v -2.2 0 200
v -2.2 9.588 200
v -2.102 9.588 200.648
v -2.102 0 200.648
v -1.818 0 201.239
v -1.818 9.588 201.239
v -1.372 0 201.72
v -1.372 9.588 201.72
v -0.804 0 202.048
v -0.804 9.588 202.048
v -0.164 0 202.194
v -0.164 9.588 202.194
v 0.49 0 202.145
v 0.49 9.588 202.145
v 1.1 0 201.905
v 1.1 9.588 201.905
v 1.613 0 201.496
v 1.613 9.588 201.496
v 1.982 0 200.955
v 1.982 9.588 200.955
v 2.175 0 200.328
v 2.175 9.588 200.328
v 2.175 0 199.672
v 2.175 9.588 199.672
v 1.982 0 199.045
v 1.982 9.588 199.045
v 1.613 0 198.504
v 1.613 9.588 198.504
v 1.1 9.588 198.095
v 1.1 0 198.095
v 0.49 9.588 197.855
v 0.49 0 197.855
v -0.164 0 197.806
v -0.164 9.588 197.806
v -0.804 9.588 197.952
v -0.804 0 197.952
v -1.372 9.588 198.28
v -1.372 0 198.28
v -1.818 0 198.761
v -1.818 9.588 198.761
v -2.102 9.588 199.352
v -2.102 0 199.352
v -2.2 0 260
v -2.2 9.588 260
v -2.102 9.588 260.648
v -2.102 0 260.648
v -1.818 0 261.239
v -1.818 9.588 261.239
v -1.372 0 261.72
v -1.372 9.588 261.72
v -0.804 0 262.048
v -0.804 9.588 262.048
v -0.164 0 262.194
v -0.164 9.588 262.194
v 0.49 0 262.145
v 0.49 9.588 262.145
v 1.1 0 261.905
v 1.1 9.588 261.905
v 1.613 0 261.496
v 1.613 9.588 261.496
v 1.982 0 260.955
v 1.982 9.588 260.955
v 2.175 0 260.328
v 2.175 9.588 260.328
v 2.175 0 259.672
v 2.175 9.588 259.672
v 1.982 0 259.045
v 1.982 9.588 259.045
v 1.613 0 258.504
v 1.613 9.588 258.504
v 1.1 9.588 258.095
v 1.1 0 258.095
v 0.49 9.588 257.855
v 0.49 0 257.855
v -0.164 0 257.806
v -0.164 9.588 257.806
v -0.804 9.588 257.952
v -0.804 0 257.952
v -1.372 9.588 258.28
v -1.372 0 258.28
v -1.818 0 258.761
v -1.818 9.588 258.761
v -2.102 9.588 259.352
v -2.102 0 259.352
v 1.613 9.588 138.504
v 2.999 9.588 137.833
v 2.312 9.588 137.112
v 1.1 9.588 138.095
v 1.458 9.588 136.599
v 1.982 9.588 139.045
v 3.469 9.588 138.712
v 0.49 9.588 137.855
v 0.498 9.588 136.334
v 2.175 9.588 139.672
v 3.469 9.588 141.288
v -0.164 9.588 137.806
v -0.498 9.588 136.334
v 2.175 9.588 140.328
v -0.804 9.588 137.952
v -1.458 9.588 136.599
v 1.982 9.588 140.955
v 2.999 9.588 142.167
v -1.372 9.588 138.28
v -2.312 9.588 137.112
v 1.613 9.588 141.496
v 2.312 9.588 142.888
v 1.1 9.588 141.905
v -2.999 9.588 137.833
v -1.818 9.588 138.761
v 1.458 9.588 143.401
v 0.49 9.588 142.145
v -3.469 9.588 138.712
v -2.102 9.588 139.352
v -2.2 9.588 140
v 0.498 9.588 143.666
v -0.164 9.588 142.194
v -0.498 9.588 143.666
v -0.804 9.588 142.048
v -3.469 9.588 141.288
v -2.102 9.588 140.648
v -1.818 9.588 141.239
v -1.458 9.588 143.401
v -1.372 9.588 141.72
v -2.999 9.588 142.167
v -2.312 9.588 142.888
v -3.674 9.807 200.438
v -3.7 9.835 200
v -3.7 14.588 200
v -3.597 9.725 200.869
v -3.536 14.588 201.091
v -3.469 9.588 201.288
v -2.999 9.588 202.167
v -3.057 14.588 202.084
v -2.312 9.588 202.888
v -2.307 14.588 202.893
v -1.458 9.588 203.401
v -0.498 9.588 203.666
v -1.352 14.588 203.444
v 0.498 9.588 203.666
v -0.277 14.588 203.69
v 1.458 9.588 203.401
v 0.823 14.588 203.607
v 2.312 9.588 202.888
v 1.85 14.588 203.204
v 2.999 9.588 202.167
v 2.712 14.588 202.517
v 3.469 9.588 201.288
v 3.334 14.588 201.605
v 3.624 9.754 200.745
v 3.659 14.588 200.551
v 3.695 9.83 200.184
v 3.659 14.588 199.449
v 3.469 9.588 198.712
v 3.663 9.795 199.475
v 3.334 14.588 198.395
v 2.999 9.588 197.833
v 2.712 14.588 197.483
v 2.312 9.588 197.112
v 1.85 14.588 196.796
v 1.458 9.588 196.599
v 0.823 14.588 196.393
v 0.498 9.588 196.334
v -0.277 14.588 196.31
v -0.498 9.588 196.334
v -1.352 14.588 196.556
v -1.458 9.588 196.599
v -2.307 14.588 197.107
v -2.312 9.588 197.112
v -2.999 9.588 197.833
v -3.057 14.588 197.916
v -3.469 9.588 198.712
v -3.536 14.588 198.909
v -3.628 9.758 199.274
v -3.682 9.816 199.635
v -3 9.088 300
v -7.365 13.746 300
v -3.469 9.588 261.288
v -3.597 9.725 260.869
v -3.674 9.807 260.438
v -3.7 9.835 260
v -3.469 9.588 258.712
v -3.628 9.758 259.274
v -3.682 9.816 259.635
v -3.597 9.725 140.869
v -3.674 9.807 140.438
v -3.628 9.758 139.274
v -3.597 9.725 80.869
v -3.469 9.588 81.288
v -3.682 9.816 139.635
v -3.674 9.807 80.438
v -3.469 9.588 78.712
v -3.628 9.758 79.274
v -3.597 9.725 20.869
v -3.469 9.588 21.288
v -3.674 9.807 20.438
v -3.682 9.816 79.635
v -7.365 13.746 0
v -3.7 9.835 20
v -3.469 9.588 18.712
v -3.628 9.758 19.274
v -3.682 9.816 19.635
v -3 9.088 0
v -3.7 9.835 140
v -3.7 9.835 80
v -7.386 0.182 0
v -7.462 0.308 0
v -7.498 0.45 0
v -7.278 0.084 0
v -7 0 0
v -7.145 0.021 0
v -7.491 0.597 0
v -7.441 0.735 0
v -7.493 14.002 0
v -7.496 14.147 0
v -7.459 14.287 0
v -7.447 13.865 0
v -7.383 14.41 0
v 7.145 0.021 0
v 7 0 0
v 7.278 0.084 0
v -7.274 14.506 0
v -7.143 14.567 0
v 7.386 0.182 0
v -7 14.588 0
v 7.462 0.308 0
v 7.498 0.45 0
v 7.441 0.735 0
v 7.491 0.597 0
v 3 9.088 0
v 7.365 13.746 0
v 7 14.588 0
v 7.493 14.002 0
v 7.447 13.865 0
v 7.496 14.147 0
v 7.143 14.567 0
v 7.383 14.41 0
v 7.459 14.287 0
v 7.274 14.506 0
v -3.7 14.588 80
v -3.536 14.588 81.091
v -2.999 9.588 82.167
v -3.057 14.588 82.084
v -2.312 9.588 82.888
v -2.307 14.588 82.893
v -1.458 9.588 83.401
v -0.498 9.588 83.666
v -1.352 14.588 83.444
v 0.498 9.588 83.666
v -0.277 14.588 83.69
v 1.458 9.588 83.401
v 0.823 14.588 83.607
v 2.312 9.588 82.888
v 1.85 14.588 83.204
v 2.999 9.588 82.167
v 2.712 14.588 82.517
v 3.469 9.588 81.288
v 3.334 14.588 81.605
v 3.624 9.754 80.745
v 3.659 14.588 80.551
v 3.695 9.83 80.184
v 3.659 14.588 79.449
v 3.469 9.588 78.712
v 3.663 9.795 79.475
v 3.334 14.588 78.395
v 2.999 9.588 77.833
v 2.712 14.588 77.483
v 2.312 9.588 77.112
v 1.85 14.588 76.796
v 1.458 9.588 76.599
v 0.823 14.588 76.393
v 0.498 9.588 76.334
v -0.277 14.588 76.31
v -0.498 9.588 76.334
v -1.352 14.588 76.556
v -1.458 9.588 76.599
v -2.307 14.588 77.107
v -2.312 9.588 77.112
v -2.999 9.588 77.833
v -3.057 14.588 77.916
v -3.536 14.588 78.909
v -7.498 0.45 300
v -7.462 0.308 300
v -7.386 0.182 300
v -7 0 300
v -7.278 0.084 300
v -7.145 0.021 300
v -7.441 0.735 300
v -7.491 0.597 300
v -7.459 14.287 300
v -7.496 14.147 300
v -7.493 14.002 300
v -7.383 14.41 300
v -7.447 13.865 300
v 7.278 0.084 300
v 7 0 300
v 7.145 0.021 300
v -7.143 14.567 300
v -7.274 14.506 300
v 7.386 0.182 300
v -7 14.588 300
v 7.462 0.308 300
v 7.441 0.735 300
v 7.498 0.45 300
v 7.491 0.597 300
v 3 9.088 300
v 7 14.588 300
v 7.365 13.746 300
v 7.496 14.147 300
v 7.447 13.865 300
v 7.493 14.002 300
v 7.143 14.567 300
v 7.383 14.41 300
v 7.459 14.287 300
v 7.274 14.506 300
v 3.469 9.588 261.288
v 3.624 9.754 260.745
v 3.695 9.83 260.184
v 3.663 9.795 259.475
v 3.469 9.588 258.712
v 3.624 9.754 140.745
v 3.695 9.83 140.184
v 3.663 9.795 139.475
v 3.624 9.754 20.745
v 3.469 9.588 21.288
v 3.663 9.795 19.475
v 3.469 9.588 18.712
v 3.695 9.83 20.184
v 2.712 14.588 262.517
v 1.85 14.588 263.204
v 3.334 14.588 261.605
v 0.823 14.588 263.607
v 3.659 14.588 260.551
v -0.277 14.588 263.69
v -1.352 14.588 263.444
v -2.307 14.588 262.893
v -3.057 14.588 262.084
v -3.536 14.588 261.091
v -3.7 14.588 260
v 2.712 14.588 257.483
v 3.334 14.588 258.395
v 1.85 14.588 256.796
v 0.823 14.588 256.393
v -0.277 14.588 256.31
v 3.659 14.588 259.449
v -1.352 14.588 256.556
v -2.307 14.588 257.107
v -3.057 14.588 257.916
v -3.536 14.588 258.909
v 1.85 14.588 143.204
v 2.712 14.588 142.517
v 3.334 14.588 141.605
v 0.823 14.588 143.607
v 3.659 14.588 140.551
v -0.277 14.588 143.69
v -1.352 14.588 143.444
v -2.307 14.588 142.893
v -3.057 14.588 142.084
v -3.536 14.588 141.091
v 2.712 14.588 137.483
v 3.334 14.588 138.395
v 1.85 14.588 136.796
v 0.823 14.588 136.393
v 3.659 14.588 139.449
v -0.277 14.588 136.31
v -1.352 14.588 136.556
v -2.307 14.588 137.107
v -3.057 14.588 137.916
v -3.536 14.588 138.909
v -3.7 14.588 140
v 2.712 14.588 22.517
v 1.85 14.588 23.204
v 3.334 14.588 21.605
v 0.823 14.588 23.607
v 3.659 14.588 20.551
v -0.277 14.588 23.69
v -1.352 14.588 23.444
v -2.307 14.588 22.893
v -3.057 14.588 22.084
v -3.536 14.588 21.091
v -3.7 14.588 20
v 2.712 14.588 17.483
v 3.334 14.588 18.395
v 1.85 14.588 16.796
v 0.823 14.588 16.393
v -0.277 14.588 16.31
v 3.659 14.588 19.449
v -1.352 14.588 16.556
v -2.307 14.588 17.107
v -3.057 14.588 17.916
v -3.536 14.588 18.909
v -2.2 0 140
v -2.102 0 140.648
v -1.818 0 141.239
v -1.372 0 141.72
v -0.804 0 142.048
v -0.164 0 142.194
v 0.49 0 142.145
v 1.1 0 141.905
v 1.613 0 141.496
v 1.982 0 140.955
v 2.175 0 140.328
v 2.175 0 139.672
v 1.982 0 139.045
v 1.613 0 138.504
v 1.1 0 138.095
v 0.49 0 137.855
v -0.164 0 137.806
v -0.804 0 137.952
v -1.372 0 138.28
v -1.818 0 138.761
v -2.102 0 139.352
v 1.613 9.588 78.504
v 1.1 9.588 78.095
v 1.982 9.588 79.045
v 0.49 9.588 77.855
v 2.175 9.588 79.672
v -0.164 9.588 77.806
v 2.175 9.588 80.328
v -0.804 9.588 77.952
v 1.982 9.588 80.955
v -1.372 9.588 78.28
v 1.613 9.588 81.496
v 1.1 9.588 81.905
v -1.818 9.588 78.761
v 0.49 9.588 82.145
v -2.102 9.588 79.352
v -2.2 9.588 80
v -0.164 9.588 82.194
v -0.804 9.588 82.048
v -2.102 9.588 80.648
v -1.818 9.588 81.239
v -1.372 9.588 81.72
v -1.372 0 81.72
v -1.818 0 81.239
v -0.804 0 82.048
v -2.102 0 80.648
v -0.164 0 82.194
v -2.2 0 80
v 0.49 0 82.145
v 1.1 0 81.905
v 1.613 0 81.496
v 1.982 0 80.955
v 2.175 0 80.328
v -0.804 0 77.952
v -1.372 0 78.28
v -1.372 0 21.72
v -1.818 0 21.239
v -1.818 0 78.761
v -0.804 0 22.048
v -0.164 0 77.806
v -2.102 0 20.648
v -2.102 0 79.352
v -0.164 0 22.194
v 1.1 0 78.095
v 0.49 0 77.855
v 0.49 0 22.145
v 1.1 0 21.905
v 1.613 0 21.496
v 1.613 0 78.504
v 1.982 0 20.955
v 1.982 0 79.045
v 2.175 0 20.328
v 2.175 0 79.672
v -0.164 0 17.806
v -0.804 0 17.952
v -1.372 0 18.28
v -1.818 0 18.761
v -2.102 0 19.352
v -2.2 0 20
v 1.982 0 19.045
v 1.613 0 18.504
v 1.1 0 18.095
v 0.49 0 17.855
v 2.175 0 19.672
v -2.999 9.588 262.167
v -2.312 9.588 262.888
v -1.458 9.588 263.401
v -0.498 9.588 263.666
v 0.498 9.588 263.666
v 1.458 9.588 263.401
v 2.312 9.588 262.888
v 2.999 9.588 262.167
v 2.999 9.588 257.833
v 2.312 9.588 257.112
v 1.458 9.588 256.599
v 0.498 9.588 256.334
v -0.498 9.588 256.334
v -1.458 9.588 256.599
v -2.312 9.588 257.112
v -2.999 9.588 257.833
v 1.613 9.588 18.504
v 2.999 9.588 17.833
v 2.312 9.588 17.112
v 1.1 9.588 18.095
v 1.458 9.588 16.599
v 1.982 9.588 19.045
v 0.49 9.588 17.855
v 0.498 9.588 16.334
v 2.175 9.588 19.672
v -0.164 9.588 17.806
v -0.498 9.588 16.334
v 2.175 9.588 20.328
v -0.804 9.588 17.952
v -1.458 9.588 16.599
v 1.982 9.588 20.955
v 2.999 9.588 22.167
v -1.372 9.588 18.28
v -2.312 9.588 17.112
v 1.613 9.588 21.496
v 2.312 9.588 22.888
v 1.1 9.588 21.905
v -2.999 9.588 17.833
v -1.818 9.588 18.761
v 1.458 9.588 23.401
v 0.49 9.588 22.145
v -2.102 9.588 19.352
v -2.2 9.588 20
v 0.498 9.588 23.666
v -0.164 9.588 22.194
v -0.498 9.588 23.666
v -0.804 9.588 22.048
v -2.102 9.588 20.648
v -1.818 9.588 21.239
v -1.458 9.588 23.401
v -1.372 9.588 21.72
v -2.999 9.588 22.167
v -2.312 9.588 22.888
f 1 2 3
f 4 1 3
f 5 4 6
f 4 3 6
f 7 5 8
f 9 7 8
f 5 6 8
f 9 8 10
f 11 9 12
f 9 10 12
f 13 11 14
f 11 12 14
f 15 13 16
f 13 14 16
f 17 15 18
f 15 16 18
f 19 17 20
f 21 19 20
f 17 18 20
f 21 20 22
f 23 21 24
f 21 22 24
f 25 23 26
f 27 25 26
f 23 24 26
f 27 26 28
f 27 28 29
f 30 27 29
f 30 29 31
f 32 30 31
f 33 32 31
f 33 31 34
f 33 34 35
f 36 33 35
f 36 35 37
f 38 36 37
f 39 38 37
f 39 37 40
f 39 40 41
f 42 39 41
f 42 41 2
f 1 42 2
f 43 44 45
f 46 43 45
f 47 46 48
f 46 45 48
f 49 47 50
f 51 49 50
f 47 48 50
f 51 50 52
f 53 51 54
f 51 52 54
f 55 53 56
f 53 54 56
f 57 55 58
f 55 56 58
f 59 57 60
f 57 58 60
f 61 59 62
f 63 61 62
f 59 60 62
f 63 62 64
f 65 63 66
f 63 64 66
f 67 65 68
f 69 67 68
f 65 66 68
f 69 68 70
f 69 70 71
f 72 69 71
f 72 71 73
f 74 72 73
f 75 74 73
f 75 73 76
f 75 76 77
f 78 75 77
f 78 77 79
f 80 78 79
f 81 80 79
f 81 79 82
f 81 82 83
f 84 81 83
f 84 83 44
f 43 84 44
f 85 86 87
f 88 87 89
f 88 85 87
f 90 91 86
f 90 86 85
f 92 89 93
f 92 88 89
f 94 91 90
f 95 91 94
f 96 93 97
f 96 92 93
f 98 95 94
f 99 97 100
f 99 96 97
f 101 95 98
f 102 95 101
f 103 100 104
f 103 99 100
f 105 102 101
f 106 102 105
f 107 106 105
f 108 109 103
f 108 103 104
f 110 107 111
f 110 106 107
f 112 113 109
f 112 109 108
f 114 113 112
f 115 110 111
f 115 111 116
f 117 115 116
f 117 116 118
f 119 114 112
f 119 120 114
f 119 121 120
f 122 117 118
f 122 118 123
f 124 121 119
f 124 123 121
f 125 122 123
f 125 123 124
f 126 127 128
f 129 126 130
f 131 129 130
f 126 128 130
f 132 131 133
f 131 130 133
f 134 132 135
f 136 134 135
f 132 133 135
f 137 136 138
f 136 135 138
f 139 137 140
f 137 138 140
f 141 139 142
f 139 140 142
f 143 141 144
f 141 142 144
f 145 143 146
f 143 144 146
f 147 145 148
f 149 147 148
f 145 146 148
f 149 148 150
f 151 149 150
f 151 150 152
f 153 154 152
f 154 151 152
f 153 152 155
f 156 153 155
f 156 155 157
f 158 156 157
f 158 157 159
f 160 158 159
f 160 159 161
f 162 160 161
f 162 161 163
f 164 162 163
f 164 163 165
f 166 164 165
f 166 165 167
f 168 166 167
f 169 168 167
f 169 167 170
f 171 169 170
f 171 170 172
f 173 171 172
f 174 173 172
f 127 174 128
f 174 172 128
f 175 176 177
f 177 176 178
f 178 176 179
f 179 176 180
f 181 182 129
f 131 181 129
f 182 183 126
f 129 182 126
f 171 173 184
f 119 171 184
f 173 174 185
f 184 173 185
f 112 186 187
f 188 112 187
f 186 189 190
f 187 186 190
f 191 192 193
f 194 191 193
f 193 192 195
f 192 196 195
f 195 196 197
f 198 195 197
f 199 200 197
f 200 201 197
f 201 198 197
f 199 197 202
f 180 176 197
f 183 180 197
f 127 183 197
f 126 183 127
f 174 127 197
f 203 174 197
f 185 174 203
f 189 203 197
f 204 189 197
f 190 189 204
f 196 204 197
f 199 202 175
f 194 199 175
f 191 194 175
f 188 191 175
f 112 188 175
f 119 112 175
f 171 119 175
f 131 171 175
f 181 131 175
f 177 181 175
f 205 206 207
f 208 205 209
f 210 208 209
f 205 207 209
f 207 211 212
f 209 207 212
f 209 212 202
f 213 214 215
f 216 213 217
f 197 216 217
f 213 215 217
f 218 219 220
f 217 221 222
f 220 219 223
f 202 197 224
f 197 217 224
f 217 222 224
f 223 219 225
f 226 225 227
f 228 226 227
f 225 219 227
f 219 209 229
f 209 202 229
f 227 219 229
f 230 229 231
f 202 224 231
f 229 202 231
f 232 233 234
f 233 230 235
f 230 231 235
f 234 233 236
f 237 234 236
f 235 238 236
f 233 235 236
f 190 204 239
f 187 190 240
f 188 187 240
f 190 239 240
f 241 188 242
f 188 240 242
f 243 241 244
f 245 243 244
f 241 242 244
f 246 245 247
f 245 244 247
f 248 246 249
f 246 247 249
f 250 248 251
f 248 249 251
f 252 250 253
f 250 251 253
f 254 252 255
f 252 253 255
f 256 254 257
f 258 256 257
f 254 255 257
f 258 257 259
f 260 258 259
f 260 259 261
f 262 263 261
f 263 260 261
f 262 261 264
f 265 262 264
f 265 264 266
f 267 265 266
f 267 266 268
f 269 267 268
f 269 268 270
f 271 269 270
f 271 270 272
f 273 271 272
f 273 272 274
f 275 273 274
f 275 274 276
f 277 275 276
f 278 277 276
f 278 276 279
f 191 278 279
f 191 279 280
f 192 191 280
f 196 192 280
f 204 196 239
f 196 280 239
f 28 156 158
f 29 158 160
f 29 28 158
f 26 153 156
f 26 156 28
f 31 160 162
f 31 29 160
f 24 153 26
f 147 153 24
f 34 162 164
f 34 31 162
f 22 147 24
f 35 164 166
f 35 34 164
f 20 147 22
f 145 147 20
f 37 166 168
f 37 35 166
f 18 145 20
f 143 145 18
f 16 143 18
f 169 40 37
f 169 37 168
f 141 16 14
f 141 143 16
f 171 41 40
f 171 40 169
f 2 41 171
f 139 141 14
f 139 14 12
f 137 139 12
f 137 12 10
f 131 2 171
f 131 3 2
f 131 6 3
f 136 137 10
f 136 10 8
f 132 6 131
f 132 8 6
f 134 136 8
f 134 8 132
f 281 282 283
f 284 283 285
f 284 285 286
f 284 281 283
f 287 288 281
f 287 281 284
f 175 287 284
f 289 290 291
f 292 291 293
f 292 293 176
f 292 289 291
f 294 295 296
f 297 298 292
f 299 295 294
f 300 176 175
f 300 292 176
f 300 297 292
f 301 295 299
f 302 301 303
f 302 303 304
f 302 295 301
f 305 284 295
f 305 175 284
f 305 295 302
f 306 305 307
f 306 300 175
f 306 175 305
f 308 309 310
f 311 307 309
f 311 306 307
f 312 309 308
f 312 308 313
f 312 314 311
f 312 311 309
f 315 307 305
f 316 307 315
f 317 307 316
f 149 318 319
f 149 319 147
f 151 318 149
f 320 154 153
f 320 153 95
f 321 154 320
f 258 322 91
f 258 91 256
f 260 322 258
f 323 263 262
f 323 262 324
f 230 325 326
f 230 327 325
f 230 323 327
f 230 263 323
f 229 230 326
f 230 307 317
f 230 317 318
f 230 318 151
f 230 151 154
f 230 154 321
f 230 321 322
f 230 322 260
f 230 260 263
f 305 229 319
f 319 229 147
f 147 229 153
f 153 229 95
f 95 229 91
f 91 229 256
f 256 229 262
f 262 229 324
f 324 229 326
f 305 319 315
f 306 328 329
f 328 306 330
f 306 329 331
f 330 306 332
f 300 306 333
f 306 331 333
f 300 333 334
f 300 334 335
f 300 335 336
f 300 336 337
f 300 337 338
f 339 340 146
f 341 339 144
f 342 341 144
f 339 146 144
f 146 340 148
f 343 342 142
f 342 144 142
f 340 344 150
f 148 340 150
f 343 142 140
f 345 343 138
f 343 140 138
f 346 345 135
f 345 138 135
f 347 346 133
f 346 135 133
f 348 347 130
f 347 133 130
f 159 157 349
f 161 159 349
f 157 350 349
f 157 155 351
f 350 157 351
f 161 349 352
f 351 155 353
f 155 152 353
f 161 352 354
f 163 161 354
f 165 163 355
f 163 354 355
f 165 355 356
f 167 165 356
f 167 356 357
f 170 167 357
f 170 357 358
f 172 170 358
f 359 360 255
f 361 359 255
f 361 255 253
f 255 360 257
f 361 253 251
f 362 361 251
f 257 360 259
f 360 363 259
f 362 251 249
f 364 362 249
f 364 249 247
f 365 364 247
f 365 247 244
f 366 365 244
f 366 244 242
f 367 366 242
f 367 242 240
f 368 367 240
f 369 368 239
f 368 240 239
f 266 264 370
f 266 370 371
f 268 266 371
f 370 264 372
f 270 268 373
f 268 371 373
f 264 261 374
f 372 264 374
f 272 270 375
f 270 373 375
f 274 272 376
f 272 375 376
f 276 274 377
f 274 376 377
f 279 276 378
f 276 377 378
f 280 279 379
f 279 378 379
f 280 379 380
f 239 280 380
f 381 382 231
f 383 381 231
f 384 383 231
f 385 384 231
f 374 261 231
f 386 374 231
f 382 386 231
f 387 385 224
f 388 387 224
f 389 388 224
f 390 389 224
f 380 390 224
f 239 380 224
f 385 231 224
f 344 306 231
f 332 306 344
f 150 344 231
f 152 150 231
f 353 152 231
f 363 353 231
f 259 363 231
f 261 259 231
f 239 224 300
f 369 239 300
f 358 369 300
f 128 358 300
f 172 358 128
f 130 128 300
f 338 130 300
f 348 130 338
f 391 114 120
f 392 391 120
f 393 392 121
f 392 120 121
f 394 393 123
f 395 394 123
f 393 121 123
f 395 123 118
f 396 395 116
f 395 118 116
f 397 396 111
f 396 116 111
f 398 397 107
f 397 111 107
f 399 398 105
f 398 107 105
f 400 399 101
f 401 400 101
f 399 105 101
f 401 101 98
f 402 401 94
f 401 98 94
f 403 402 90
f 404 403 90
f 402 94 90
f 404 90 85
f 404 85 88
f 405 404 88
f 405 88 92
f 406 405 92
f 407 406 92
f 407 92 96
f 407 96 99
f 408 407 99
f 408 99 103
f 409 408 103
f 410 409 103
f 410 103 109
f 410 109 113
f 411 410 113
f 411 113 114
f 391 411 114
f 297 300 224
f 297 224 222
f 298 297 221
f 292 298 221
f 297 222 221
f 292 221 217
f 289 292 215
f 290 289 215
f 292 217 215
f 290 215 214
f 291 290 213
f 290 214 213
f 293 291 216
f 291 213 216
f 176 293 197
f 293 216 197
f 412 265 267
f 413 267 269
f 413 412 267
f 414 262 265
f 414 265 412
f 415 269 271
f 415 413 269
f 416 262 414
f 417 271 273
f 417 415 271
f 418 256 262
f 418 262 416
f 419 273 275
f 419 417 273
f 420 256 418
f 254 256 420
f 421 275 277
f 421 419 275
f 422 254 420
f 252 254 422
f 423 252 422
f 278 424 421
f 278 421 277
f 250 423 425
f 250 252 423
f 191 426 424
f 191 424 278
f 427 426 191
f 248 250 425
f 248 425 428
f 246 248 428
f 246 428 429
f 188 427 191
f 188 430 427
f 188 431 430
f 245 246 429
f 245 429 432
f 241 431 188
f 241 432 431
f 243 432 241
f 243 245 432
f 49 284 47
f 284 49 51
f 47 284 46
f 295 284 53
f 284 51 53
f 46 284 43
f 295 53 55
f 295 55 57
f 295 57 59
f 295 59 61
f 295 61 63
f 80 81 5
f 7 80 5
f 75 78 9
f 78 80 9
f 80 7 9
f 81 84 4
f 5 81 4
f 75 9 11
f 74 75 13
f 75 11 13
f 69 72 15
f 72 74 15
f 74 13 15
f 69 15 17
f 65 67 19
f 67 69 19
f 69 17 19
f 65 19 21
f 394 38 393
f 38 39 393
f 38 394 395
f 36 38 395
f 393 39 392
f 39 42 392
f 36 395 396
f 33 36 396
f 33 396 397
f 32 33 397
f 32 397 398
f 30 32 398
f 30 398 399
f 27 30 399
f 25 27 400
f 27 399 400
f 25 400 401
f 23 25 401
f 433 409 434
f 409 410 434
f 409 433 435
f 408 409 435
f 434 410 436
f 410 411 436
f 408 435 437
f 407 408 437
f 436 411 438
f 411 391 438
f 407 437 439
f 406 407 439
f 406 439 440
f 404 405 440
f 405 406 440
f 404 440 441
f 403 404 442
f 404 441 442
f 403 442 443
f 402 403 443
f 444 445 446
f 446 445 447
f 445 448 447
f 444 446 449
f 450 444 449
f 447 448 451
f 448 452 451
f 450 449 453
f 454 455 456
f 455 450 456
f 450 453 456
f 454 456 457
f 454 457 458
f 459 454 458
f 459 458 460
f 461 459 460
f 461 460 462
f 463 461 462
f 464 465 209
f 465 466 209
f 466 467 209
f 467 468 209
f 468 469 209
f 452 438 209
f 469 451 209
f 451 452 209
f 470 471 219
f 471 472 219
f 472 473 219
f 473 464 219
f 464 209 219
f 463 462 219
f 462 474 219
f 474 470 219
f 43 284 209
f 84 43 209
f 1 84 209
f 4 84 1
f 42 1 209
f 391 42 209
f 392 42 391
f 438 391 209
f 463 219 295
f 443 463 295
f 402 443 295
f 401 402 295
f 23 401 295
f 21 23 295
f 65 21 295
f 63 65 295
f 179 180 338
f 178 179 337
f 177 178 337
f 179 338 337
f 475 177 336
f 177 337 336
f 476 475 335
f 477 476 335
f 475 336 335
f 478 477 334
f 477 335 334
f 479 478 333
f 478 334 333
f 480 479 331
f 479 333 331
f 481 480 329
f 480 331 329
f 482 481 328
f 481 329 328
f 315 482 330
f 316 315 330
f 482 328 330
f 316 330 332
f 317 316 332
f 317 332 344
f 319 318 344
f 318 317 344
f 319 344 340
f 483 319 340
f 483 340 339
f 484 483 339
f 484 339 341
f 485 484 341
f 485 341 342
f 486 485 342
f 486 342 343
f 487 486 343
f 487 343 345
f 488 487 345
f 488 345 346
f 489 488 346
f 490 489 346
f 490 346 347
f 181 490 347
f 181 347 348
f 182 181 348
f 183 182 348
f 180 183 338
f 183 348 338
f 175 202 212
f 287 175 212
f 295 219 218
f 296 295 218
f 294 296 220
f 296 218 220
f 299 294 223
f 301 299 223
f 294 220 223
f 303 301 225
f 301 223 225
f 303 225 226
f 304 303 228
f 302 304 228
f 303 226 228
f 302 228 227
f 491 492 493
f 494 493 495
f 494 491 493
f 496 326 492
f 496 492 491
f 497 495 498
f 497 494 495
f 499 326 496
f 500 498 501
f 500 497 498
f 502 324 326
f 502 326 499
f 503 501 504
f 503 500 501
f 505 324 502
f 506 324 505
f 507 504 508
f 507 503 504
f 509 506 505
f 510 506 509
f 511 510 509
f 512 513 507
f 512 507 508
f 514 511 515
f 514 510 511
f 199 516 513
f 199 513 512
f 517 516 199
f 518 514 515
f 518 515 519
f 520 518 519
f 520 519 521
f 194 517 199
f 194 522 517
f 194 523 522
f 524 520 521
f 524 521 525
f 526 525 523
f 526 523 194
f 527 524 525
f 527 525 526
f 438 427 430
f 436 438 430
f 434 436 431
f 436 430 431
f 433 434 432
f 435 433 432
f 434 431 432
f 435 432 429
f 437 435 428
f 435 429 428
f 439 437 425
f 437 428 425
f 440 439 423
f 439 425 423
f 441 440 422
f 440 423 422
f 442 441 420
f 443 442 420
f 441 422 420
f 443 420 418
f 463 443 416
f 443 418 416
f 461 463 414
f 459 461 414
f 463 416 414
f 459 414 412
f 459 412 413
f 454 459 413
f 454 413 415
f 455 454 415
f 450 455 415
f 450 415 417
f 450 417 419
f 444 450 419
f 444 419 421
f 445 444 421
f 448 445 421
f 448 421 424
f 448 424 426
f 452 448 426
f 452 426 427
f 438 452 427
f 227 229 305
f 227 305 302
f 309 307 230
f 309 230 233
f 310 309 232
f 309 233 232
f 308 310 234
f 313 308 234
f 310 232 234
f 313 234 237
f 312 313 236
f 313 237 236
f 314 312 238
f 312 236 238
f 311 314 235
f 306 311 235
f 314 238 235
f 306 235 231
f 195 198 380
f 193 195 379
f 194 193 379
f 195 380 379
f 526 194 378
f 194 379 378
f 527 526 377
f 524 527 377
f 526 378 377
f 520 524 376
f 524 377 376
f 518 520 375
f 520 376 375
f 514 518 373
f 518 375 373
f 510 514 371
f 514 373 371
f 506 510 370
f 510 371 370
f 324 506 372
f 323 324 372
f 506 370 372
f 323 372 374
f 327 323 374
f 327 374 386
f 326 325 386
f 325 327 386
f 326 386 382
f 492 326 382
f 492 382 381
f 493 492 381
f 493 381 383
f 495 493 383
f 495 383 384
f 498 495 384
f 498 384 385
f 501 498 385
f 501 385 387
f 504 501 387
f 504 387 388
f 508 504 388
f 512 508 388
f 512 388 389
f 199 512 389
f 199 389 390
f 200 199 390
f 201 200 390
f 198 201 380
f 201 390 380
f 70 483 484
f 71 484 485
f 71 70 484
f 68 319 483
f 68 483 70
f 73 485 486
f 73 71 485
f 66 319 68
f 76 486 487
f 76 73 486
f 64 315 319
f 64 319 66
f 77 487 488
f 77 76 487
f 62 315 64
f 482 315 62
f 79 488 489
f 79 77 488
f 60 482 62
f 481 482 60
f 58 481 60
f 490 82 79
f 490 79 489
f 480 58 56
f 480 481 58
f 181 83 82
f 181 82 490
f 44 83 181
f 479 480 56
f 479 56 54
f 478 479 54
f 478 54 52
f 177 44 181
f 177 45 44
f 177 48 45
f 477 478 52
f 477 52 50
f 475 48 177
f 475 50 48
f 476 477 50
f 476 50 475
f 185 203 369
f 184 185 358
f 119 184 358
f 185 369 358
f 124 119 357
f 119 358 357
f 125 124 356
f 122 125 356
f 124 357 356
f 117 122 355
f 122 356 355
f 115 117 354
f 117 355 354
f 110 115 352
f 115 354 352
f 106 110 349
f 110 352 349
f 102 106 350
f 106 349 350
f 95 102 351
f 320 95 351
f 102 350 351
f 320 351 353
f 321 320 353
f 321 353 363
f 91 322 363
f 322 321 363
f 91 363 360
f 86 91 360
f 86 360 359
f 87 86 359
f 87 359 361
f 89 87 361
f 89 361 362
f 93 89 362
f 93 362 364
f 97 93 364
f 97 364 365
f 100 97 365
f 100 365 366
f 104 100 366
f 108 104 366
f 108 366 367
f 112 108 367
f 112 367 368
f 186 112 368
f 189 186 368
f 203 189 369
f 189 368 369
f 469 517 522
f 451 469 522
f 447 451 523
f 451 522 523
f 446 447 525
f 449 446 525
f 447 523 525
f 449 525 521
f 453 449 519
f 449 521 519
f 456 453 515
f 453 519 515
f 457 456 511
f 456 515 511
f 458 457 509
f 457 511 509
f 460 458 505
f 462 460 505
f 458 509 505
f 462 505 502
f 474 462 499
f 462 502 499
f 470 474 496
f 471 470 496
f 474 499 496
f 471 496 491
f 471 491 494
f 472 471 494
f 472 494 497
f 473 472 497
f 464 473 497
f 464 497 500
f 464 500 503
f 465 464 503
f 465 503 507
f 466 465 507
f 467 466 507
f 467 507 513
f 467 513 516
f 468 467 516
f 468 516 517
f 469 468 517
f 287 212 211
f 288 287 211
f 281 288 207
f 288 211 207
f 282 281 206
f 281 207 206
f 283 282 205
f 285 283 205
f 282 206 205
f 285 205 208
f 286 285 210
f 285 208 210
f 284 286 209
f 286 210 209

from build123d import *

# Parameters (mm, degrees)
PAD_DEPTH       = 300
SKETCH001_R     = 2.2
POCKET_DEPTH    = 14.588933
SKETCH002_R     = 3.7
POCKET001_DEPTH = 5


with BuildPart() as part:
    # Sketch → Pad (new body)
    with BuildSketch(Plane.XY):
        with BuildLine():
            Line((-7, 0), (7, 0))
            ThreePointArc((7, 0), (7.428584, 0.242481), (7.441474, 0.734736))
            Line((3, 9.087933), (7.441474, 0.734736))
            Line((7.364852, 13.746052), (3, 9.087933))
            ThreePointArc((7.364852, 13.746052), (7.458771, 14.286754), (7, 14.587933))
            Line((7, 14.587933), (-7, 14.587933))
            ThreePointArc((-7, 14.587933), (-7.458771, 14.286754), (-7.364852, 13.746052))
            Line((-7.364852, 13.746052), (-3, 9.087933))
            Line((-3, 9.087933), (-7.441474, 0.734736))
            ThreePointArc((-7.441474, 0.734736), (-7.428584, 0.242481), (-7, 0))
        make_face()
    extrude(amount=PAD_DEPTH)

    # Sketch001 (on Face2 of Pad) → Pocket (cut, through all)
    with BuildSketch(Plane(origin=(0, 14.587933, 0), x_dir=(-1, 0, 0), z_dir=(0, 1, 0))):
        with Locations((0, 20)):
            Circle(SKETCH001_R)
        with Locations((0, 80)):
            Circle(SKETCH001_R)
        with Locations((0, 140)):
            Circle(SKETCH001_R)
        with Locations((0, 200)):
            Circle(SKETCH001_R)
        with Locations((0, 260)):
            Circle(SKETCH001_R)
    extrude(amount=-POCKET_DEPTH, mode=Mode.SUBTRACT)

    # Sketch002 → Pocket001 (cut)
    with BuildSketch(Plane(origin=(0, 14.587933, 0), x_dir=(-1, 0, 0), z_dir=(0, 1, 0))):
        with Locations((0, 260)):
            Circle(SKETCH002_R)
        with Locations((0, 200)):
            Circle(SKETCH002_R)
        with Locations((0, 140)):
            Circle(SKETCH002_R)
        with Locations((0, 80)):
            Circle(SKETCH002_R)
        with Locations((0, 20)):
            Circle(SKETCH002_R)
    extrude(amount=-POCKET001_DEPTH, mode=Mode.SUBTRACT)


solid = part.part
